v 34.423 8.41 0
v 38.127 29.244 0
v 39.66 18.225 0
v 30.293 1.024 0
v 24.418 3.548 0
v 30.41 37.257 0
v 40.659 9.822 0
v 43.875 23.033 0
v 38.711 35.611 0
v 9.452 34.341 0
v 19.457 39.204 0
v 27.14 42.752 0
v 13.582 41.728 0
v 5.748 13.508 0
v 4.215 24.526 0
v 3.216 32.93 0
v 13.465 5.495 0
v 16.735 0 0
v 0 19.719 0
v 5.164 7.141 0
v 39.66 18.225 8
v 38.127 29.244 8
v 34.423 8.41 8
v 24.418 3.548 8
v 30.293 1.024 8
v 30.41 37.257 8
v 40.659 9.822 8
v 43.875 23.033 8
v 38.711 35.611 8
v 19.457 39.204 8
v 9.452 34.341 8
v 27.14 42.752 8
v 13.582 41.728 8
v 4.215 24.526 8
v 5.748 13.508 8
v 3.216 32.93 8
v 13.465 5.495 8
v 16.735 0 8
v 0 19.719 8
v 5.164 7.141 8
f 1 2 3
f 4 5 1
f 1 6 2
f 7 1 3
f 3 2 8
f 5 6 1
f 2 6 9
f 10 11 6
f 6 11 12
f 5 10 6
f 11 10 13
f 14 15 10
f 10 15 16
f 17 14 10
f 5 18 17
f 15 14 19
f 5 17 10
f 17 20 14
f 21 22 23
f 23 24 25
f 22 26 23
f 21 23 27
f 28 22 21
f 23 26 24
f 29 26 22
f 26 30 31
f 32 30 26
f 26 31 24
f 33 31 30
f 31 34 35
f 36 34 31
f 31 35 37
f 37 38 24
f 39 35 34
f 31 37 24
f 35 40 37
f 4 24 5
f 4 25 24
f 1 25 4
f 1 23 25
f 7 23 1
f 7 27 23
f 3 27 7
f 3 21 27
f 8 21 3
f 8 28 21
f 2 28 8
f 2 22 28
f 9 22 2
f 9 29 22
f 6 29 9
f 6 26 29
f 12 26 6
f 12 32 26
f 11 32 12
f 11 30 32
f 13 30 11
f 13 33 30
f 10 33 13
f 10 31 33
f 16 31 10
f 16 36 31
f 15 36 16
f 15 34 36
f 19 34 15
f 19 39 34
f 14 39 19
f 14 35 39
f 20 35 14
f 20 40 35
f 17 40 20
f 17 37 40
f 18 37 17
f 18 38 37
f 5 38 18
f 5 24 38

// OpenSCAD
$fn = 32;

// ----------------------------------------------------------------------
// Chain sprocket: 10 teeth, 18 mm root radius
// ----------------------------------------------------------------------

// --- parameters (mm) ---
profile_height = 8;       // extrusion height
profile_points = 20;      // points of the closed outline

profile = [[39.66, 18.225], [43.875, 23.033], [38.127, 29.244], [38.711, 35.611], [30.41, 37.257], [27.14, 42.752], [19.457, 39.204], [13.582, 41.728], [9.452, 34.341], [3.216, 32.93], [4.215, 24.526], [0, 19.719], [5.748, 13.508], [5.164, 7.141], [13.465, 5.495], [16.735, 0], [24.418, 3.548], [30.293, 1.024], [34.423, 8.41], [40.659, 9.822]];  // single closed polygon, 20 points, counter clockwise

// --- the one profile operation ---
linear_extrude(height = profile_height) polygon(points = profile);
